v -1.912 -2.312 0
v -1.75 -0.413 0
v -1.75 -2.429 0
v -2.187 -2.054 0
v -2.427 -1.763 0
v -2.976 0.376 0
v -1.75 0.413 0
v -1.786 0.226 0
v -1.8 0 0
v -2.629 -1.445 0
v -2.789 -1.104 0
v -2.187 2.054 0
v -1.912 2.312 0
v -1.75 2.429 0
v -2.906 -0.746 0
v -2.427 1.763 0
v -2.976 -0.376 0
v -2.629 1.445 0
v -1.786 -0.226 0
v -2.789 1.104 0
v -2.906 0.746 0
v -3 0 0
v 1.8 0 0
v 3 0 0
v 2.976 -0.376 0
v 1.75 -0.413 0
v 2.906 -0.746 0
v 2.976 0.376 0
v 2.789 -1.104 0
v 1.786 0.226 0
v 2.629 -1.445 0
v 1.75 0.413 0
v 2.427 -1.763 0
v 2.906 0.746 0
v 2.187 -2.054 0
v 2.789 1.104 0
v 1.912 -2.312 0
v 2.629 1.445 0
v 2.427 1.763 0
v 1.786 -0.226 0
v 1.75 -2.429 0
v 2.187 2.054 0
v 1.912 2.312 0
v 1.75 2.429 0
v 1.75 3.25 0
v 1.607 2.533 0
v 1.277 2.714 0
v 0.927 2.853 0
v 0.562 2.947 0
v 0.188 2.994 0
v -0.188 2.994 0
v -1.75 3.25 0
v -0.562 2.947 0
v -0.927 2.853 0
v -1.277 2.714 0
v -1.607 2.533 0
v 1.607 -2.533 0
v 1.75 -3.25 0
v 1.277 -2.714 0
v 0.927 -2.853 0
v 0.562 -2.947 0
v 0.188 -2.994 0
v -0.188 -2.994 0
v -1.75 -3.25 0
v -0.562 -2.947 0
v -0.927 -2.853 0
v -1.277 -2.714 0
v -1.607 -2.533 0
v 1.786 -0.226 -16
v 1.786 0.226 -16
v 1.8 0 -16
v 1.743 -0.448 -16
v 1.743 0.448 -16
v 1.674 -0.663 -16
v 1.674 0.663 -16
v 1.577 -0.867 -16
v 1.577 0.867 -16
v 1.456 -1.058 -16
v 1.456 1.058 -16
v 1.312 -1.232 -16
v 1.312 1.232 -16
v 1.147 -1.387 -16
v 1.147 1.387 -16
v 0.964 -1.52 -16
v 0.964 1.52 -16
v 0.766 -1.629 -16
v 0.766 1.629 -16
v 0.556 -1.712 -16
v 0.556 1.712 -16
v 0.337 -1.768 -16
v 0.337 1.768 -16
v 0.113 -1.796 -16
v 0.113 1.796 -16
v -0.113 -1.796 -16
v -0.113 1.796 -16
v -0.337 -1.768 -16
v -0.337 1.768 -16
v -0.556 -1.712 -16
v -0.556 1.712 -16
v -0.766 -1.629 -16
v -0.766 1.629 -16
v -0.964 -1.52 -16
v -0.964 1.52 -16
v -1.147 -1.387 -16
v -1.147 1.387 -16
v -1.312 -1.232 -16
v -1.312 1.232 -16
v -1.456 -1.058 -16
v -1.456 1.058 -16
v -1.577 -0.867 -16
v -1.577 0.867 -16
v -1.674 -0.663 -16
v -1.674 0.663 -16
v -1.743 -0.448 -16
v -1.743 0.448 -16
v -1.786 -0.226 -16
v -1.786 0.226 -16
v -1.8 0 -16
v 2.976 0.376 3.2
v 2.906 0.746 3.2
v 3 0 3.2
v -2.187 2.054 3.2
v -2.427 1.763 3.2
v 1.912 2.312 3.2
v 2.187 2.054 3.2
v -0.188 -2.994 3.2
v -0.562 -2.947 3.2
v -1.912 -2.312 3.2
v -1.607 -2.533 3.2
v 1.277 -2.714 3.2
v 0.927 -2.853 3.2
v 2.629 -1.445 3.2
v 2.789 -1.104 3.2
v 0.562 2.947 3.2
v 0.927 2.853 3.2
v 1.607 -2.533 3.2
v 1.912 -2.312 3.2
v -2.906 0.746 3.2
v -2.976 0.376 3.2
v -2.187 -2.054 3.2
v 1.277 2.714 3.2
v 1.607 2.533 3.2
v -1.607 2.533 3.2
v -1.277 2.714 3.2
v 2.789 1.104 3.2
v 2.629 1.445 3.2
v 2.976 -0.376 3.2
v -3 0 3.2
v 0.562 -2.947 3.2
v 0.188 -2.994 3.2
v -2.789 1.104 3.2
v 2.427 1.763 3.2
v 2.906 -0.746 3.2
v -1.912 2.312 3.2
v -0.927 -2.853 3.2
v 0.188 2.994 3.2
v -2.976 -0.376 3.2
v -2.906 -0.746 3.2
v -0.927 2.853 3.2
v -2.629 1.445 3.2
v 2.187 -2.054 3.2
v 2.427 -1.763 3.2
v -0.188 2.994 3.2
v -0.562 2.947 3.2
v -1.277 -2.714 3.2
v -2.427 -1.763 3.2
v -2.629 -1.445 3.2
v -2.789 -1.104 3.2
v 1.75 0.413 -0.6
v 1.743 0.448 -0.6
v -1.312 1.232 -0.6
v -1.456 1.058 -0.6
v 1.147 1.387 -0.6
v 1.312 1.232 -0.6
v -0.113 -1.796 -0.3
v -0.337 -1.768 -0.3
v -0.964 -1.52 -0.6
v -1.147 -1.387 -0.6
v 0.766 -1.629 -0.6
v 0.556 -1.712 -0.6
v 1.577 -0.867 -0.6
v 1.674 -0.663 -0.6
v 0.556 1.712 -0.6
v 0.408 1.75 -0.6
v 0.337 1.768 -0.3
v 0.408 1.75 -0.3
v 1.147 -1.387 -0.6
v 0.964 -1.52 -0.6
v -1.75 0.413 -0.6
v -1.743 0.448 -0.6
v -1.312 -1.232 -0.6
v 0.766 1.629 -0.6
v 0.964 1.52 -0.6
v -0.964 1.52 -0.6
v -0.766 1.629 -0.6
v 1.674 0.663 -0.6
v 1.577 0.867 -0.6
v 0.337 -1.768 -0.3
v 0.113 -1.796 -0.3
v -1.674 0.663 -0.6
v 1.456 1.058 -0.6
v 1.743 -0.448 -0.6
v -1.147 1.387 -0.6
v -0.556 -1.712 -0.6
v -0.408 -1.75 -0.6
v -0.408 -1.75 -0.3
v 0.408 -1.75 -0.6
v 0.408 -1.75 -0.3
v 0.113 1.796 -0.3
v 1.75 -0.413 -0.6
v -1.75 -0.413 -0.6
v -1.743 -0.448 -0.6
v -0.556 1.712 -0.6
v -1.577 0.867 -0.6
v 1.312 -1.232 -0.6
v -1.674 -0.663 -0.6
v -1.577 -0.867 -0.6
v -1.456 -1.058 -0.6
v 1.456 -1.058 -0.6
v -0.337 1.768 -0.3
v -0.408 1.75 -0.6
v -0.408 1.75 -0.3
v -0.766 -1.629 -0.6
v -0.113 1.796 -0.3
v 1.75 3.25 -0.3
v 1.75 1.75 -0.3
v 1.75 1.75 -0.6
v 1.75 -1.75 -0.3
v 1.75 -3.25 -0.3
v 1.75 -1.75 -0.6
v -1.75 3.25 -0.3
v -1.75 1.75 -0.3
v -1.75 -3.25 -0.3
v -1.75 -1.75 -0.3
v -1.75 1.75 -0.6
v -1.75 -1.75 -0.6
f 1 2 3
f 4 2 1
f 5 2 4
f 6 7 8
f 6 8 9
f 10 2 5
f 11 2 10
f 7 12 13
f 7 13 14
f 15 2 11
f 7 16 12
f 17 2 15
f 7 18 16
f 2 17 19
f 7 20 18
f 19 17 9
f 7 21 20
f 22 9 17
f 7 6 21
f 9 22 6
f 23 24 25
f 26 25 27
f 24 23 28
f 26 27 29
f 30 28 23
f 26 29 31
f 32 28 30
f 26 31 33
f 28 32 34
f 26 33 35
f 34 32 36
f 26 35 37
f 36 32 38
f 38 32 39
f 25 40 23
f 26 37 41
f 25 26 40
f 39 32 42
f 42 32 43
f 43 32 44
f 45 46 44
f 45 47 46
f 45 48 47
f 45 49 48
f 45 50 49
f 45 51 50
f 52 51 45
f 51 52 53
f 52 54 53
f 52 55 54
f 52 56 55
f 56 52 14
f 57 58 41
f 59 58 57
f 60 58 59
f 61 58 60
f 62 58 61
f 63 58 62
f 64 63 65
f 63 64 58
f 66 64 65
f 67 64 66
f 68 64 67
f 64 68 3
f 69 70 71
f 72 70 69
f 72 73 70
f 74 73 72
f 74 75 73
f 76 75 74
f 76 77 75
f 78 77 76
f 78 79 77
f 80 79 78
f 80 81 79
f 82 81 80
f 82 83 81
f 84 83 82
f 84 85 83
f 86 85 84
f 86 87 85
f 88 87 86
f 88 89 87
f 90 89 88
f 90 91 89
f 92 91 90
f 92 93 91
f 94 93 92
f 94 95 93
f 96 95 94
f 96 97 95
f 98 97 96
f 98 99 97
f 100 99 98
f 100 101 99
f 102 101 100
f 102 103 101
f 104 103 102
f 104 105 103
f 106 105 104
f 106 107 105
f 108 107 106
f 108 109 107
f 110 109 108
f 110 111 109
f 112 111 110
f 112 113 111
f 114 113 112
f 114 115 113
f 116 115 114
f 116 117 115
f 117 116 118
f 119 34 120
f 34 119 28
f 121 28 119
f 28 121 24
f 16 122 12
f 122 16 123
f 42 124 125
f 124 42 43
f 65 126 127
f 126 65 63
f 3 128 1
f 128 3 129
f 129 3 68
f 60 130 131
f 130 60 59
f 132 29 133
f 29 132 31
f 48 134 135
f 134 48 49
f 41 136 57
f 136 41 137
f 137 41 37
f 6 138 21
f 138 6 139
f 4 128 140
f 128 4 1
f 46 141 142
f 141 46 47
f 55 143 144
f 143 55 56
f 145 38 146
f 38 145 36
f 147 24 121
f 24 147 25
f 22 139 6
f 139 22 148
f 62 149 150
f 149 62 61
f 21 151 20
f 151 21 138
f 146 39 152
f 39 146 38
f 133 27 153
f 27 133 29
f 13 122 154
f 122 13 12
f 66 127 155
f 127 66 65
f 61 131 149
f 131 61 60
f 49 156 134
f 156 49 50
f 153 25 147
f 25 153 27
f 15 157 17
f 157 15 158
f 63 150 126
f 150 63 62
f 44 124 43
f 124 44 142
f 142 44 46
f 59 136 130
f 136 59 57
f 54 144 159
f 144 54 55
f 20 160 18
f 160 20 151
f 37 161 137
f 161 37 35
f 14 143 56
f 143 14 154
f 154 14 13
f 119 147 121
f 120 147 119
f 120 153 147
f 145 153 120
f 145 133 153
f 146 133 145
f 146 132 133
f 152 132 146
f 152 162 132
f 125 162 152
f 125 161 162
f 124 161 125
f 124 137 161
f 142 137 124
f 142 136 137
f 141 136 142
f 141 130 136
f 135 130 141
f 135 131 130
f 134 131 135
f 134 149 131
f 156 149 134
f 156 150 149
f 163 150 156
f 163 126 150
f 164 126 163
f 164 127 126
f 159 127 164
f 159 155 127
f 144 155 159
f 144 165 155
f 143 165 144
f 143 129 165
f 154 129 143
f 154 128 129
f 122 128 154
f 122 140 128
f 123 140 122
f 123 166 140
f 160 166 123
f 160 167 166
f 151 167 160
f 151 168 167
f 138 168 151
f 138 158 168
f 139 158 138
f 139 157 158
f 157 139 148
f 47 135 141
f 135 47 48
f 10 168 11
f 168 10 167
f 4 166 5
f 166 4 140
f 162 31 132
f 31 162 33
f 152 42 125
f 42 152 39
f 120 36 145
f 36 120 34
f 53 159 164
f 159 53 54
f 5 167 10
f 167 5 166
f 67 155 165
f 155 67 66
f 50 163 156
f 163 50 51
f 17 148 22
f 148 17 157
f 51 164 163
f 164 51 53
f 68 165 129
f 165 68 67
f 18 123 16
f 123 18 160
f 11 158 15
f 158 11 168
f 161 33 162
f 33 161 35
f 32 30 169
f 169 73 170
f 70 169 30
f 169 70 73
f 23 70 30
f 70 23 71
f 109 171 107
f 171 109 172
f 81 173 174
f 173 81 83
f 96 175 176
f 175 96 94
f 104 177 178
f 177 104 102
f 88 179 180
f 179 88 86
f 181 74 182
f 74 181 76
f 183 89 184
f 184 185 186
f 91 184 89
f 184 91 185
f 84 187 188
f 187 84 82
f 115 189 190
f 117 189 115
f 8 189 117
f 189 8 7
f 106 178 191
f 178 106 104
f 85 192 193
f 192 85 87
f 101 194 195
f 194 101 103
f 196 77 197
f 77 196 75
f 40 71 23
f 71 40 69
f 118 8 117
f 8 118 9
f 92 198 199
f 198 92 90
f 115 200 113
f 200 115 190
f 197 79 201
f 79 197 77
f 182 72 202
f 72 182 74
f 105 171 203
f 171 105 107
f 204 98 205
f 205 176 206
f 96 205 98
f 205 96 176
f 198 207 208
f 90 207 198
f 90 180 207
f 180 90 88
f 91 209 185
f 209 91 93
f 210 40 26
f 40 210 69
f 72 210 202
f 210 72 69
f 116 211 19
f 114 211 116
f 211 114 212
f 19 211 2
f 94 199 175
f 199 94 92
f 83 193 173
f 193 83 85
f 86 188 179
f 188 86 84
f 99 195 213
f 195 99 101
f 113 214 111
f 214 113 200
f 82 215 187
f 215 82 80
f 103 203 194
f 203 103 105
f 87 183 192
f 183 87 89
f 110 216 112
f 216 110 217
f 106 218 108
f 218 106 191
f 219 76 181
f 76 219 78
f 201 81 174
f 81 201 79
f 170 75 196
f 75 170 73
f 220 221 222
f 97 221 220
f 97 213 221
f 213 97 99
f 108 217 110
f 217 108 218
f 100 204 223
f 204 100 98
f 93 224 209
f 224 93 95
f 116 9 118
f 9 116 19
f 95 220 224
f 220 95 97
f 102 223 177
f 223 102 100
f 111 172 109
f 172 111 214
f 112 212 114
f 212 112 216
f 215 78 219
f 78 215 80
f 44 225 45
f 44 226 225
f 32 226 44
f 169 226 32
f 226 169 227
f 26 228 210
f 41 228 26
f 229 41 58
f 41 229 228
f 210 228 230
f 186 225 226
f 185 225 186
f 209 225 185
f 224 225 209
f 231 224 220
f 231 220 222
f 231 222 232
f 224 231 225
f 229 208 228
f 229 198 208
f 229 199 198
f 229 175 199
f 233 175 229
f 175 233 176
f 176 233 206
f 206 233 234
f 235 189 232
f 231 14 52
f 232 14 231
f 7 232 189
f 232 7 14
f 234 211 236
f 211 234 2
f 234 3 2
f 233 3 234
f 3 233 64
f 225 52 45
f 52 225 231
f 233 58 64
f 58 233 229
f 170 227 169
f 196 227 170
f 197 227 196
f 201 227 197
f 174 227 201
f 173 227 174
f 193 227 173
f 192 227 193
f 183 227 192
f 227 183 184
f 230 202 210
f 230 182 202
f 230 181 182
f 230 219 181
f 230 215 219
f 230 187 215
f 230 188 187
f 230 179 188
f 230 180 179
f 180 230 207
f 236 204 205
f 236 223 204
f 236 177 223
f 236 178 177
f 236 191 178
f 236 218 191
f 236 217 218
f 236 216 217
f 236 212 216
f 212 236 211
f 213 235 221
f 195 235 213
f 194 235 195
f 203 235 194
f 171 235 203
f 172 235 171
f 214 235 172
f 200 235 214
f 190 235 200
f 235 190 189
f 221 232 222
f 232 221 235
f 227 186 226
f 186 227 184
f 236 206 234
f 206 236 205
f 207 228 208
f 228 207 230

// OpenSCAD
$fn = 50;


difference() {
	union() {
		translate(v = [0, 0, 0]) {
			rotate(a = [0, 0, 0]) {
				difference() {
					union() {
						translate(v = [0, 0, -16.0000000000]) {
							cylinder(h = 16, r = 1.5000000000);
						}
						cylinder(h = 3.2000000000, r = 3.0000000000);
						translate(v = [0, 0, -16.0000000000]) {
							cylinder(h = 16, r = 1.8000000000);
						}
						translate(v = [-1.7500000000, -3.2500000000, -0.3000000000]) {
							cube(size = [3.5000000000, 6.5000000000, 0.3000000000]);
						}
						translate(v = [-1.7500000000, -1.7500000000, -0.6000000000]) {
							cube(size = [3.5000000000, 3.5000000000, 0.3000000000]);
						}
						translate(v = [0, 0, -16.0000000000]) {
							cylinder(h = 16, r = 1.5000000000);
						}
					}
					union();
				}
			}
		}
	}
	union();
}
